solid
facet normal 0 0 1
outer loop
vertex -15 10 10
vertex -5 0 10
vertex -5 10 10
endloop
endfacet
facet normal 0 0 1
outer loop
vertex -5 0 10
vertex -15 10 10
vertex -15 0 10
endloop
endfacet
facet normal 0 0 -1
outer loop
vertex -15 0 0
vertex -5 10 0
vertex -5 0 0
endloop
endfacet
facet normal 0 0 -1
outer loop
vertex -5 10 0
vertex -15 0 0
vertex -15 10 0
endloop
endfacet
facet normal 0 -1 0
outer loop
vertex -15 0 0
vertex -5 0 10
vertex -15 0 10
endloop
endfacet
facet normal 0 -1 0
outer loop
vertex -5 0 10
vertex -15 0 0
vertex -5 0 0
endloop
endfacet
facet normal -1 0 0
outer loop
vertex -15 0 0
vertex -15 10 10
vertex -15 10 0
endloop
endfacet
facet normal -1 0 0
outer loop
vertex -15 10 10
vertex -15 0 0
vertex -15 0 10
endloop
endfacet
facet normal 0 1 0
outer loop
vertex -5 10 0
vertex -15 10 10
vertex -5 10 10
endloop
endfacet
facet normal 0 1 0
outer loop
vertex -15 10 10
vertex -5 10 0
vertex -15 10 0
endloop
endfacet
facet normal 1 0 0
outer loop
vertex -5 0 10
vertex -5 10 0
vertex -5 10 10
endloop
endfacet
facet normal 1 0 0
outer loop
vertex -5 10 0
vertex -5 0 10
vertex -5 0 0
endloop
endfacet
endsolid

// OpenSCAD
// scale with a negative component flips winding. scad.ts has no mirror() and
// mesh.ts refuses a transform whose determinant is <= 0 — measure what happens.
scale([-1, 1, 1]) translate([5, 0, 0]) cube([10, 10, 10]);
